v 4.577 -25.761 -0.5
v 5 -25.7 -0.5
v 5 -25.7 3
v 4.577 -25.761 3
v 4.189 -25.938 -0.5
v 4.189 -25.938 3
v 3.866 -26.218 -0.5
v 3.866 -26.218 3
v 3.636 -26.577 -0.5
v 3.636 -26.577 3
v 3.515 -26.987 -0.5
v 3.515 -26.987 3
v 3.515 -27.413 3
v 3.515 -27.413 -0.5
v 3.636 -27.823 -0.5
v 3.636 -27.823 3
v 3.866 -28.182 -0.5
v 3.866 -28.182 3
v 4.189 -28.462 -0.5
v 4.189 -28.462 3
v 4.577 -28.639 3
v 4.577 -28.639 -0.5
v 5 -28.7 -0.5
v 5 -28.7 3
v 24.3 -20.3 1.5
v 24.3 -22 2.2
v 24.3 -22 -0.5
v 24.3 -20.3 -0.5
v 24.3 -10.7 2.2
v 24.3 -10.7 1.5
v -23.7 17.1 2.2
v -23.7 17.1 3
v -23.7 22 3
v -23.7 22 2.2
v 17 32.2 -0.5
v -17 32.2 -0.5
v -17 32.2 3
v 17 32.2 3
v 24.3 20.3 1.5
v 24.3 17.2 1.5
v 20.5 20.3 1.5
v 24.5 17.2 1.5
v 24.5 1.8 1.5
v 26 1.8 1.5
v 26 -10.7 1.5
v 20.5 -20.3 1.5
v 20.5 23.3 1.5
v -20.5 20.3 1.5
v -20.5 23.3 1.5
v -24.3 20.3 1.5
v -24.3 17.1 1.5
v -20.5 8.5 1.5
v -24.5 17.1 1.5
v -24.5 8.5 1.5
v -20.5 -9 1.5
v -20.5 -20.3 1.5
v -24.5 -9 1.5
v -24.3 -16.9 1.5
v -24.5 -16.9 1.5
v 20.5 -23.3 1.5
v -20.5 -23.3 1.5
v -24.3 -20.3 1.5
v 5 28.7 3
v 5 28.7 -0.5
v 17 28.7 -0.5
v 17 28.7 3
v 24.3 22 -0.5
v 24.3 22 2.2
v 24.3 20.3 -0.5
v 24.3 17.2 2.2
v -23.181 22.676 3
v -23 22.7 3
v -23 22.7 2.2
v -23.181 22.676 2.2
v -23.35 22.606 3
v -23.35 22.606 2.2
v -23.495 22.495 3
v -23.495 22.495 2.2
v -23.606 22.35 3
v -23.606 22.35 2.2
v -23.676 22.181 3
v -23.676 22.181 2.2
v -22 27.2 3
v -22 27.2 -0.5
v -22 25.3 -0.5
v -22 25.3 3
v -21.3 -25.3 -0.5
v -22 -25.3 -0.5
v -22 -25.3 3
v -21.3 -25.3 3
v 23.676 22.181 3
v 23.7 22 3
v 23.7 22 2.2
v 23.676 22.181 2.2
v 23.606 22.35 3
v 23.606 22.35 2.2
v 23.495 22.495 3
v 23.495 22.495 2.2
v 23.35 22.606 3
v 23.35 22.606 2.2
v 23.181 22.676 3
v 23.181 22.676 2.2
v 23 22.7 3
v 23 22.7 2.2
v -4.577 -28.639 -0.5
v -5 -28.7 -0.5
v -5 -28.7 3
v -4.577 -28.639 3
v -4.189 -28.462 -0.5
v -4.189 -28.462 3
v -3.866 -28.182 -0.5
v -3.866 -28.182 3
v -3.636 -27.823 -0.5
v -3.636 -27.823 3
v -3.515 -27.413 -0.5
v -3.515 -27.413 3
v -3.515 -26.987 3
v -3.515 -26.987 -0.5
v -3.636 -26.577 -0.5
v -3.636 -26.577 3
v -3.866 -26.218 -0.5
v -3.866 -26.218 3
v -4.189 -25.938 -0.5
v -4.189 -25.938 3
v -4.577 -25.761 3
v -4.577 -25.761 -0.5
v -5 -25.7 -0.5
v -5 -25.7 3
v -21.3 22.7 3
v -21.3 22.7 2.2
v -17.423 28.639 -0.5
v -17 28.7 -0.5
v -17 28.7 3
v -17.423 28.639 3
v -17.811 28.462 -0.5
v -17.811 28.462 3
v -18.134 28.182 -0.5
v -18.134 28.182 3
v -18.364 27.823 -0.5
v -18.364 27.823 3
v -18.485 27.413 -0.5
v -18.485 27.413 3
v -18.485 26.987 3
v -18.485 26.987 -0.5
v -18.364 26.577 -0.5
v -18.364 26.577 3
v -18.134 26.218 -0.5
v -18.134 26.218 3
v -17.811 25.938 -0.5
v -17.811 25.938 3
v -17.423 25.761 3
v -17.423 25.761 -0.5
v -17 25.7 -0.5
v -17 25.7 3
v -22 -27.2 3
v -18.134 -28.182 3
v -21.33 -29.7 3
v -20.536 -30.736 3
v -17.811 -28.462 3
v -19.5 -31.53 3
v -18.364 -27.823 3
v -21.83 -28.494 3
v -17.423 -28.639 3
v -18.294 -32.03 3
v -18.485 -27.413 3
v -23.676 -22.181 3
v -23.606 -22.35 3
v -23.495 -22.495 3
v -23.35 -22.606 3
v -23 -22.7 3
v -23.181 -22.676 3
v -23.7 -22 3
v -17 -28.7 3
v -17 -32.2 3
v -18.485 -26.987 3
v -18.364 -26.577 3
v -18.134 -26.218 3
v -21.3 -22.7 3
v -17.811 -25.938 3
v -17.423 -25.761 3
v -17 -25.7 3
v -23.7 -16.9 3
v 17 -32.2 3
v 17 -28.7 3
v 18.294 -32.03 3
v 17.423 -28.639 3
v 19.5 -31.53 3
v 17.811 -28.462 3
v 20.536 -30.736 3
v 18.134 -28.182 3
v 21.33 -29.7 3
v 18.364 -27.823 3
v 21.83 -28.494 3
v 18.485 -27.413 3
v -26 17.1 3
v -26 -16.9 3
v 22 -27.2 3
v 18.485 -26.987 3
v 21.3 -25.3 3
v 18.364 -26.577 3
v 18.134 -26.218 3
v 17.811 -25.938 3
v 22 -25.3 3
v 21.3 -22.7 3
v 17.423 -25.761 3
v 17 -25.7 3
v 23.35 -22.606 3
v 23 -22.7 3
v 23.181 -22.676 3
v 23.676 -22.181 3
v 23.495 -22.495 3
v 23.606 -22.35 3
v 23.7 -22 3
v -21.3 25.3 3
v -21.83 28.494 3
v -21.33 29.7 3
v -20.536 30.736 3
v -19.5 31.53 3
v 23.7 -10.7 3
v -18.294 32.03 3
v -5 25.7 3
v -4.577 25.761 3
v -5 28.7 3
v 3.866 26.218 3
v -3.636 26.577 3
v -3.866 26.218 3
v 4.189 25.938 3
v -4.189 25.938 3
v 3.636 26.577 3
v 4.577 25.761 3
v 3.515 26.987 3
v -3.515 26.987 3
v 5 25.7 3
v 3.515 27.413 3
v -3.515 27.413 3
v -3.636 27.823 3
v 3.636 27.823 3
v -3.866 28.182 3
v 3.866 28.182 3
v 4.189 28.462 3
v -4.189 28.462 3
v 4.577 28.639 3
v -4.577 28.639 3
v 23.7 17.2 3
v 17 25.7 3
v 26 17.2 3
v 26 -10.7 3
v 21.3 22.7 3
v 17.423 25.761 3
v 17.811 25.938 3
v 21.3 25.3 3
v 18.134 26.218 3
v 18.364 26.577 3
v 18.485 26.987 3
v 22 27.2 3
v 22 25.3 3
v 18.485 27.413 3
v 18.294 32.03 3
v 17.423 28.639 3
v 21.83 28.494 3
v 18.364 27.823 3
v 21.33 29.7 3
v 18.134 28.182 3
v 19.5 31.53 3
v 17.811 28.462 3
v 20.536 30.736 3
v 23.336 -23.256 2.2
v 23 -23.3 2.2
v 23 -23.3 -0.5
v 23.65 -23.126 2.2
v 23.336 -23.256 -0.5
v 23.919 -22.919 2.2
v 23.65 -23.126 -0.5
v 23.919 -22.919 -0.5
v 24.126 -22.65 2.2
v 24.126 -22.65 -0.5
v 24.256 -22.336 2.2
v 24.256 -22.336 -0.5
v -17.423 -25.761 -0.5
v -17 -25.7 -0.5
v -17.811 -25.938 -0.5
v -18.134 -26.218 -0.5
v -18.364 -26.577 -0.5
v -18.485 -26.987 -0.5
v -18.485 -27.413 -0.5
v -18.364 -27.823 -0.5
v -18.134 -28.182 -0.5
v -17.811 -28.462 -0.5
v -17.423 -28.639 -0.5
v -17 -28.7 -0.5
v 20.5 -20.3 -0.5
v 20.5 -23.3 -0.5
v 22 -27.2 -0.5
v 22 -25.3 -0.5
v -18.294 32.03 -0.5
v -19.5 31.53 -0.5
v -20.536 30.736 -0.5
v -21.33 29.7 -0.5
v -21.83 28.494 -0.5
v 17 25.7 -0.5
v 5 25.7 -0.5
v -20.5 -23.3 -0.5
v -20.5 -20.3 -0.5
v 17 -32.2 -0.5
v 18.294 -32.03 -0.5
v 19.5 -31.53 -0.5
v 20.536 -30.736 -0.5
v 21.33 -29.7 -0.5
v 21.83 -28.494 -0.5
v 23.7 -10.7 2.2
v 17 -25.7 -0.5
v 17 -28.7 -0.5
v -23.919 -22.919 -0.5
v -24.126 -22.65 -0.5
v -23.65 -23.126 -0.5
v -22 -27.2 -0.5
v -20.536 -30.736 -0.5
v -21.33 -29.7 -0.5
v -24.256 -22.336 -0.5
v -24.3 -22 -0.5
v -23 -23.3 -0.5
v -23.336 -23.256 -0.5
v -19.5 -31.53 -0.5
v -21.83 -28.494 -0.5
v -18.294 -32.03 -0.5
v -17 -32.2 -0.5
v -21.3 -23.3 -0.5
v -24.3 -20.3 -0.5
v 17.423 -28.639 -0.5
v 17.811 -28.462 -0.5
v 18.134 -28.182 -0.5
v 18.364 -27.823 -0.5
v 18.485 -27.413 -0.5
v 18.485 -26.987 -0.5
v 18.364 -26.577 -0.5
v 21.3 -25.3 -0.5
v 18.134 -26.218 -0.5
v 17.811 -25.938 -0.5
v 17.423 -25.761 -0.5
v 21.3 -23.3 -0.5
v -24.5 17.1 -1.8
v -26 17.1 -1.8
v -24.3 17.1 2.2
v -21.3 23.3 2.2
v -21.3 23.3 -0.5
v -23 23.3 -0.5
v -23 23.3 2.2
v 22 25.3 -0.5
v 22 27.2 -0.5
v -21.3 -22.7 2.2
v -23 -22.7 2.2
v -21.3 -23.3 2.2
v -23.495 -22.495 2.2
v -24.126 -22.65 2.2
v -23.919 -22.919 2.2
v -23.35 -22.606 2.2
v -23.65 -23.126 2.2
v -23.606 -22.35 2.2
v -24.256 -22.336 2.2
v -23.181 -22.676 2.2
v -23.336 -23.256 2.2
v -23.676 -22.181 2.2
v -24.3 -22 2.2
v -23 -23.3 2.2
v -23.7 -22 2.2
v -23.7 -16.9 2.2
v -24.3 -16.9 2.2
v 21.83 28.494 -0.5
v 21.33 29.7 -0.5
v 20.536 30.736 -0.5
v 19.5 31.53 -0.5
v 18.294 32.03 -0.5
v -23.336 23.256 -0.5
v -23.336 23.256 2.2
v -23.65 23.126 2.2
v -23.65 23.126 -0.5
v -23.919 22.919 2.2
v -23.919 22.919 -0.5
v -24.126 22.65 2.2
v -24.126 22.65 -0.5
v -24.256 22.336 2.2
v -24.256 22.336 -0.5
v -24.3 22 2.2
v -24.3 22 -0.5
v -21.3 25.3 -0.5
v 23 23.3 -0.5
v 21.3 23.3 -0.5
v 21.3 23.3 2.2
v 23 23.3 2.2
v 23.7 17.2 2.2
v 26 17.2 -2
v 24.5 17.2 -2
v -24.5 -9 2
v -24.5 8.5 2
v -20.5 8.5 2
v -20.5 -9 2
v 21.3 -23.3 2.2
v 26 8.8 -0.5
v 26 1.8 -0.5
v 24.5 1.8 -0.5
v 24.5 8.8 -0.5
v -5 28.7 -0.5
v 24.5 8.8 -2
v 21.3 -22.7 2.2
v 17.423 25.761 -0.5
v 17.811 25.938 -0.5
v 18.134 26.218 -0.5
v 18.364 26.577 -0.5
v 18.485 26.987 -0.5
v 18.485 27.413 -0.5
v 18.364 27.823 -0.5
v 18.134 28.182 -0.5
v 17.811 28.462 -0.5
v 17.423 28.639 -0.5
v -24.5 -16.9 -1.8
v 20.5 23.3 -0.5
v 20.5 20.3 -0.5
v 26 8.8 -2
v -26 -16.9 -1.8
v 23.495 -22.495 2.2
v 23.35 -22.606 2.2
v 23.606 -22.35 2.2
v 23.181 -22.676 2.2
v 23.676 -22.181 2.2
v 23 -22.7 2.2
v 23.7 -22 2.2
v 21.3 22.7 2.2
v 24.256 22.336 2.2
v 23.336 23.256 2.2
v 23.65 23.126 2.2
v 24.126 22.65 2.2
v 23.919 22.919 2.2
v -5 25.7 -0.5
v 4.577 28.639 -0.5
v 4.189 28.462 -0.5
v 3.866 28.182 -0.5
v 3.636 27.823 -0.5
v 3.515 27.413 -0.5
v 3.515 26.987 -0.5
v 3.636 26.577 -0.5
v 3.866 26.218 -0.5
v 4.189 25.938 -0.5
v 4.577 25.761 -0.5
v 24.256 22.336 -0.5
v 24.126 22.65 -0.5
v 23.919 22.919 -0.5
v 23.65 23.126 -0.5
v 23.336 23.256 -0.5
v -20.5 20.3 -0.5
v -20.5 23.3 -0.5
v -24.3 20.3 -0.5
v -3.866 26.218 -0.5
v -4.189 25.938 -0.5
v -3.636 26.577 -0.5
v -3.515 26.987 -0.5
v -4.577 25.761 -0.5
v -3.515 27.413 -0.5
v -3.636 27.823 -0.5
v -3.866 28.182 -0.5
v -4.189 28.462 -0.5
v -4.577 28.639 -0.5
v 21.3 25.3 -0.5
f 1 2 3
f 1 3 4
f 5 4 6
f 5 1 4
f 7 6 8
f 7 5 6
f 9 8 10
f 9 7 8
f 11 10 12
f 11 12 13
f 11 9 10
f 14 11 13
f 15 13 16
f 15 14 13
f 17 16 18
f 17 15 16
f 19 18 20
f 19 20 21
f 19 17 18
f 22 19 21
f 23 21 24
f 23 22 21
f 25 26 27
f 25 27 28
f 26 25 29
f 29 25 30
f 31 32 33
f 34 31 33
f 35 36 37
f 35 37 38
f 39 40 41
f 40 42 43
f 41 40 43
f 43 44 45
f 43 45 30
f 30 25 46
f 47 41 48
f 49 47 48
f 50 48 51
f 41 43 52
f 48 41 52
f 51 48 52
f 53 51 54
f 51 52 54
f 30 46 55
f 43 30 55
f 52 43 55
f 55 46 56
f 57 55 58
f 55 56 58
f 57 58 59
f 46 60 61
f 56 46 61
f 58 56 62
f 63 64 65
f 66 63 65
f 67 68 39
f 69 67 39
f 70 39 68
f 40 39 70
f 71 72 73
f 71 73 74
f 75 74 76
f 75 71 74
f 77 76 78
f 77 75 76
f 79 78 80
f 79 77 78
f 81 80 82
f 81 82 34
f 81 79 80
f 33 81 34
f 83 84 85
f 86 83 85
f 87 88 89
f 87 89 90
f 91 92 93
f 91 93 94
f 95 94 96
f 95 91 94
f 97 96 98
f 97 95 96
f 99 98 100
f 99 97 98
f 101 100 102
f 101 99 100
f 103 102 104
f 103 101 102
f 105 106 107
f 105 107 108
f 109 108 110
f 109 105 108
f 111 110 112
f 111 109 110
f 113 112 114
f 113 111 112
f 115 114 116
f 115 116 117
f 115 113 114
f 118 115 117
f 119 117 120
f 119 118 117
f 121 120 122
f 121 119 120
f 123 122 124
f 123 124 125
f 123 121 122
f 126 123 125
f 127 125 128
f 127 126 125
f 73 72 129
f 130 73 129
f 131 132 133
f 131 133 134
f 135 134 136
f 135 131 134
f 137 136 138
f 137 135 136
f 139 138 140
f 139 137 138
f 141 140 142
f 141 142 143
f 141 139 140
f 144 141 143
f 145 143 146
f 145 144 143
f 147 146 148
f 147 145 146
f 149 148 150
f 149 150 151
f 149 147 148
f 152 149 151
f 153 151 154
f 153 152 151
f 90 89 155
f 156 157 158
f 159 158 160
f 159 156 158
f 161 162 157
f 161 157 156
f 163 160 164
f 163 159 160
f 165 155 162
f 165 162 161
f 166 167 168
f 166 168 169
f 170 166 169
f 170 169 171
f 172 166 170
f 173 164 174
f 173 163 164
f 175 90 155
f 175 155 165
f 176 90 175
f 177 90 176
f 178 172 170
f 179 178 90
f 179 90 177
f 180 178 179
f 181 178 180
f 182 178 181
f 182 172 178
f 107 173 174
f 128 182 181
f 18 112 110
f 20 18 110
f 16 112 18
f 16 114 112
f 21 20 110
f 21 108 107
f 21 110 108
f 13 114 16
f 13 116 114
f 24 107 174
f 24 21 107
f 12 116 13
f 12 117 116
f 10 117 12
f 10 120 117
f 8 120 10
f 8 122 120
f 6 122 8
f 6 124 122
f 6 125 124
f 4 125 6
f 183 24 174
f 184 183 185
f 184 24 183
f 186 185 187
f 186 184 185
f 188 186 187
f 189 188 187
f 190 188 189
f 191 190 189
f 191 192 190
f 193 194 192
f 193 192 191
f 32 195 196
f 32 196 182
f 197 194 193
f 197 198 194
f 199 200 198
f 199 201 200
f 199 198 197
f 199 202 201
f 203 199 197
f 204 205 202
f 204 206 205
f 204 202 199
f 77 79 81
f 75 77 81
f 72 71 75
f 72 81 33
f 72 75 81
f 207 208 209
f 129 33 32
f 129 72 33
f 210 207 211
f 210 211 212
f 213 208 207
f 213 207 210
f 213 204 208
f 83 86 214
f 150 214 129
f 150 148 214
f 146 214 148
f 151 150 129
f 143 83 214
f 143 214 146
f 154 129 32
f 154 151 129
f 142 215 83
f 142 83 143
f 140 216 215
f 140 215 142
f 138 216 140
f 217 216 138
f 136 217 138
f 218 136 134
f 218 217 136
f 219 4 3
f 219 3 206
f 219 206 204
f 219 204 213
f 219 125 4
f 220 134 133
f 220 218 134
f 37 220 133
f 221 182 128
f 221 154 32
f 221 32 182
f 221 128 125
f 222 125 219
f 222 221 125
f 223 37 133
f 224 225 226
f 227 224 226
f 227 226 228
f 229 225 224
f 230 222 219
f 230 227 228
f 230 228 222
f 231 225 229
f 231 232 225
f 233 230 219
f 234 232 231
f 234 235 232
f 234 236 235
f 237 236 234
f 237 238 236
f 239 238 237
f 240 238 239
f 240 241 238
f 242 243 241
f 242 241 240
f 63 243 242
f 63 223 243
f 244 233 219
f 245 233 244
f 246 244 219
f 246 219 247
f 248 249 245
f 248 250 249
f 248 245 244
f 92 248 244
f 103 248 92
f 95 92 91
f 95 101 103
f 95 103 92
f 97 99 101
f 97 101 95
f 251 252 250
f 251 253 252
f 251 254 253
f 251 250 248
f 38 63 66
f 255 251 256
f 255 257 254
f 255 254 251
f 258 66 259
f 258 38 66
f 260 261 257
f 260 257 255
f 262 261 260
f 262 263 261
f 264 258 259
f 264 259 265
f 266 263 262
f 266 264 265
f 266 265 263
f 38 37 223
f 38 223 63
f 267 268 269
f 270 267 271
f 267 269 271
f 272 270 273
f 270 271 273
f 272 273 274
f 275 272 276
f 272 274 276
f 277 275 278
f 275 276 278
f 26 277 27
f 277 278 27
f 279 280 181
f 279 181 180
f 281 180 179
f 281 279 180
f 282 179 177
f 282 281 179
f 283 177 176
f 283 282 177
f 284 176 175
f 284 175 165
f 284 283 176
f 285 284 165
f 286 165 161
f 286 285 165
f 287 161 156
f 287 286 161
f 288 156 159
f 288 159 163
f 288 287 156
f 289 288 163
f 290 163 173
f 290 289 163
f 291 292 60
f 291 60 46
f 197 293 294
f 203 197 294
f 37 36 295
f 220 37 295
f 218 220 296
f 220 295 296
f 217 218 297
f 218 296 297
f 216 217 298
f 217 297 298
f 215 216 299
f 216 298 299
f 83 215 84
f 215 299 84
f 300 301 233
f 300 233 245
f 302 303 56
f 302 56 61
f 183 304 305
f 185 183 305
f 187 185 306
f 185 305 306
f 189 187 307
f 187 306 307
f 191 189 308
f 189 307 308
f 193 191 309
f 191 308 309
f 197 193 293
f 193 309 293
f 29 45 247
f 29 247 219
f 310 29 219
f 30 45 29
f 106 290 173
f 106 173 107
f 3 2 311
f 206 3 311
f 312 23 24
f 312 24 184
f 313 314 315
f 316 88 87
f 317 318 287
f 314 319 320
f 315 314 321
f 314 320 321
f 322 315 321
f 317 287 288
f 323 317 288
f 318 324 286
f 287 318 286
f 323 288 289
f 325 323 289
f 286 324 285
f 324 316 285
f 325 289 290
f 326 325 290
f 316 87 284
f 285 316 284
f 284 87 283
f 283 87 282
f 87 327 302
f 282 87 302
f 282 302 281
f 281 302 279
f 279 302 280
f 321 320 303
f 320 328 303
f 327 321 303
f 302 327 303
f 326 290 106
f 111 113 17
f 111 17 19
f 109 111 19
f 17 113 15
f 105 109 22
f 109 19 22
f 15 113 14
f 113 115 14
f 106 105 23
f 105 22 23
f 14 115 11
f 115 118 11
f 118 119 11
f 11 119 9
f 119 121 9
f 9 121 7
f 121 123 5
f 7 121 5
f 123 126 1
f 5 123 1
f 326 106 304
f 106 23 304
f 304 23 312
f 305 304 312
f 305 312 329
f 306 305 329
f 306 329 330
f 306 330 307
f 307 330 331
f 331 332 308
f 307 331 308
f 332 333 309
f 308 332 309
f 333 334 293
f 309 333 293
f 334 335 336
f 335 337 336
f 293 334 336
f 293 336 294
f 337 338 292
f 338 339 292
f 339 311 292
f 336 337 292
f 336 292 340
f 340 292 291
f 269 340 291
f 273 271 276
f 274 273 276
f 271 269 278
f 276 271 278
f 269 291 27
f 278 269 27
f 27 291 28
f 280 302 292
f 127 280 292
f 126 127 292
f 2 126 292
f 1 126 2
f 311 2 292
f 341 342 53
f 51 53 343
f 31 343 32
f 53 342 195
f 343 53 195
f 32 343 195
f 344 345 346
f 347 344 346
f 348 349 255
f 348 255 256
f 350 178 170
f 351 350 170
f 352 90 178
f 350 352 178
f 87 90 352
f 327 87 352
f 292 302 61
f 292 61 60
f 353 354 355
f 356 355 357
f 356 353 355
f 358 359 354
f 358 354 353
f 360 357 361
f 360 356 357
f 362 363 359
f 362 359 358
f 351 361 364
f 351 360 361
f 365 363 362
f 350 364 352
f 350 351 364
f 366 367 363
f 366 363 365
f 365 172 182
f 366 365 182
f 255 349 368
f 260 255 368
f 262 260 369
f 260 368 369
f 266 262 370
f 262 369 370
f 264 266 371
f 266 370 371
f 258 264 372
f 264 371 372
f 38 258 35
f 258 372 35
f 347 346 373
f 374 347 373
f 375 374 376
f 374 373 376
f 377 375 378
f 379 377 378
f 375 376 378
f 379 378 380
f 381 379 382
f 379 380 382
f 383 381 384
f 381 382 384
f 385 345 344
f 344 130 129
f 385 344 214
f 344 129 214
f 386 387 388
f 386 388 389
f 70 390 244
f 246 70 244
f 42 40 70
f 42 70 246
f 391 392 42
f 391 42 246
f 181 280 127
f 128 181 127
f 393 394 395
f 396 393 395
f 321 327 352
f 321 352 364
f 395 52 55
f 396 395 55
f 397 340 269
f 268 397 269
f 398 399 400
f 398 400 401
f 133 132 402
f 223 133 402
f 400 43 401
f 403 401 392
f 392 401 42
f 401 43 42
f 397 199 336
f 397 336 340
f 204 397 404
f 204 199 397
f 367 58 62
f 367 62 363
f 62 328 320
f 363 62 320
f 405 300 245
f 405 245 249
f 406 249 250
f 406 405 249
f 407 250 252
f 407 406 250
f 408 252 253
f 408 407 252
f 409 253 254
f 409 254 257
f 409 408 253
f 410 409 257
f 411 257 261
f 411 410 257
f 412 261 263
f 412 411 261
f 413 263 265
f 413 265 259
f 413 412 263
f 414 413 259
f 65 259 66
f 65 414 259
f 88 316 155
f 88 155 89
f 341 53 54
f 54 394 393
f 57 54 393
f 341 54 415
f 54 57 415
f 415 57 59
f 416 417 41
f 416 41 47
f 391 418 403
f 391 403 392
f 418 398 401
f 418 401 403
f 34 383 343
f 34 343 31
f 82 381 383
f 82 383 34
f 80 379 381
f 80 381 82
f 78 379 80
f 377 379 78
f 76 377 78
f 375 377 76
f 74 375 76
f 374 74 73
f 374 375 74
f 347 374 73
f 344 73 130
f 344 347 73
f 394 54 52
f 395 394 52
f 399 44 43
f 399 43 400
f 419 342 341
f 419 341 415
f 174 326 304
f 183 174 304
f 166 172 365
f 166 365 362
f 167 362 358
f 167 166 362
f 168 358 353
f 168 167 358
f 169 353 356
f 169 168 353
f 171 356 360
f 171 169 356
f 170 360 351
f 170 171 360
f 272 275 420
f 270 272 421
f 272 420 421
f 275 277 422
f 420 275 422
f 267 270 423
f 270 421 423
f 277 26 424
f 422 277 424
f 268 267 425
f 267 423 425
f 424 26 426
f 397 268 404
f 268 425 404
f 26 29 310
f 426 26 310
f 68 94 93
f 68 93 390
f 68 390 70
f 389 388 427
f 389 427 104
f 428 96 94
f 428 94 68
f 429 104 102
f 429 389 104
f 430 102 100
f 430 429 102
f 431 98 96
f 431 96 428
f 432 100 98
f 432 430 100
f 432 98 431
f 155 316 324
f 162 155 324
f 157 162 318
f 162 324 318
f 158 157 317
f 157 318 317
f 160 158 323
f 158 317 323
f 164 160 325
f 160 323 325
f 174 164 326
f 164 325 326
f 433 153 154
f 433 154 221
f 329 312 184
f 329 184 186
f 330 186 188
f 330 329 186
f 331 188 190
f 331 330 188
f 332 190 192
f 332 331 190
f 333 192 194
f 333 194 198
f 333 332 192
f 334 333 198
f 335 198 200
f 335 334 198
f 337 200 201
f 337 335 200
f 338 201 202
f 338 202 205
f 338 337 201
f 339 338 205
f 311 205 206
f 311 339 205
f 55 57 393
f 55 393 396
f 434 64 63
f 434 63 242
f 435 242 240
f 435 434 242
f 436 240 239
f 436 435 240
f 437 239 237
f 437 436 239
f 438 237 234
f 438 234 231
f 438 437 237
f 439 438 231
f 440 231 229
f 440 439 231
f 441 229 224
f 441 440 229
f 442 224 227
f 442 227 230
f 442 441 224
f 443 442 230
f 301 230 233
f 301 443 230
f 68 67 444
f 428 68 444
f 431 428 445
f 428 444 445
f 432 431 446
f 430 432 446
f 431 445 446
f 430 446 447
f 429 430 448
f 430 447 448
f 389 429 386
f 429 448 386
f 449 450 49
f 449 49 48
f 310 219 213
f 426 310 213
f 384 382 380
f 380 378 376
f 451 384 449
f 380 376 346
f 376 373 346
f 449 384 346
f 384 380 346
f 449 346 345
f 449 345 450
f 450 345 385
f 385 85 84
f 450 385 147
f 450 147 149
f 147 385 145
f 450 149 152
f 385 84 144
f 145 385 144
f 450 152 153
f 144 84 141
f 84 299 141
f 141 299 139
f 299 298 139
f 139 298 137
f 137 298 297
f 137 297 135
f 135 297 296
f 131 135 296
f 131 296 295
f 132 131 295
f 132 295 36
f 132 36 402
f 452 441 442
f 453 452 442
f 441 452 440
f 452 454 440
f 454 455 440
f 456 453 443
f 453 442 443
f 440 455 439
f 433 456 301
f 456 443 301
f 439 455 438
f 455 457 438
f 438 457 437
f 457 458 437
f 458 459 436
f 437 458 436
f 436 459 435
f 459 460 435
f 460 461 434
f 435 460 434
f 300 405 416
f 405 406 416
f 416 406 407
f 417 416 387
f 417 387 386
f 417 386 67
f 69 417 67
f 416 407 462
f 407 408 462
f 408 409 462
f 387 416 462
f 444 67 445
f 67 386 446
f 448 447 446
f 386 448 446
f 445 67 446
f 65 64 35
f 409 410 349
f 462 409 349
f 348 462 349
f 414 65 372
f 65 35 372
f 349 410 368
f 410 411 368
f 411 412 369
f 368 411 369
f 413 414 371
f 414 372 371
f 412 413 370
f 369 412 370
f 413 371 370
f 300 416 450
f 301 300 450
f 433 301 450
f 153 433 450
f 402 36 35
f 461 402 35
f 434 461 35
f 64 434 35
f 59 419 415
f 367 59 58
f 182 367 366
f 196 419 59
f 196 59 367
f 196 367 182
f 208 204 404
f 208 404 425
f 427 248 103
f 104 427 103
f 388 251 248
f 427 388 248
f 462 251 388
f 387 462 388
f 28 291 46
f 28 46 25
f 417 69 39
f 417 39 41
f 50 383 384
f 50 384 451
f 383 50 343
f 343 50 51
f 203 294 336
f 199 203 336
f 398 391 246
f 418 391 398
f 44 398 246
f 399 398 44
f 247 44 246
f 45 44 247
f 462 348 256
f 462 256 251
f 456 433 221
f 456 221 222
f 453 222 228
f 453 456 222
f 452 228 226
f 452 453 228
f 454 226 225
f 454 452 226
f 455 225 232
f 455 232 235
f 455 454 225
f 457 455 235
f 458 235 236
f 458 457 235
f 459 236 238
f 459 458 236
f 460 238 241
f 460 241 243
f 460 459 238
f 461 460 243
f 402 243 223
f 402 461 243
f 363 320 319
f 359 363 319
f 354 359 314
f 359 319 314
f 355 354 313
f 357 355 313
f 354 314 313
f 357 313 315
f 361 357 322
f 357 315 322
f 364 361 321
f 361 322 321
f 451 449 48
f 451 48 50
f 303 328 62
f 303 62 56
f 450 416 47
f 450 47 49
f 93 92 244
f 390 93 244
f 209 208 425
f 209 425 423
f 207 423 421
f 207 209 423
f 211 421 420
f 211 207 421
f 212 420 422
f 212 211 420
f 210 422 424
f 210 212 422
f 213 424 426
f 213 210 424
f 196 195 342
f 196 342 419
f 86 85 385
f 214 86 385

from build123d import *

# Parameters (mm, degrees)
PAD017_DEPTH    = 3.5
POCKET027_DEPTH = 2
SKETCH054_W     = 34
SKETCH054_H     = 4.8
PAD020_DEPTH    = 1.5
PAD021_DEPTH    = 1.5
SKETCH049_W     = 4
SKETCH049_H     = 17.5
POCKET028_DEPTH = 0.5
POCKET029_DEPTH = 0.8


with BuildPart() as part:
    # Sketch045 → Pad017 (new body)
    with BuildSketch(Plane.XY):
        with BuildLine():
            ThreePointArc((-23, 23.3), (-23.9192388155, 22.9192388155), (-24.3, 22))
            Line((-24.3, 22), (-24.3, 17.1))
            Line((-26, 17.1), (-24.3, 17.1))
            Line((-26, -16.9), (-26, 17.1))
            Line((-24.3, -16.9), (-26, -16.9))
            Line((-24.3, -16.9), (-24.3, -22))
            ThreePointArc((-24.3, -22), (-23.9192388155, -22.9192388155), (-23, -23.3))
            Line((-21.3, -23.3), (-23, -23.3))
            Line((-21.3, -25.3), (-21.3, -23.3))
            Line((-22, -25.3), (-21.3, -25.3))
            Line((-22, -27.2), (-22, -25.3))
            ThreePointArc((-22, -27.2), (-20.5355339059, -30.7355339059), (-17, -32.2))
            Line((-17, -32.2), (17, -32.2))
            ThreePointArc((17, -32.2), (20.5355339059, -30.7355339059), (22, -27.2))
            Line((22, -27.2), (22, -25.3))
            Line((22, -25.3), (21.3, -25.3))
            Line((21.3, -25.3), (21.3, -23.3))
            Line((21.3, -23.3), (23, -23.3))
            ThreePointArc((23, -23.3), (23.9192388155, -22.9192388155), (24.3, -22))
            Line((24.3, -22), (24.3, -10.7))
            Line((26, -10.7), (24.3, -10.7))
            Line((26, 17.2), (26, -10.7))
            Line((24.3, 17.2), (26, 17.2))
            Line((24.3, 22), (24.3, 17.2))
            ThreePointArc((24.3, 22), (23.9192388155, 22.9192388155), (23, 23.3))
            Line((21.3, 23.3), (23, 23.3))
            Line((21.3, 25.3), (21.3, 23.3))
            Line((22, 25.3), (21.3, 25.3))
            Line((22, 27.2), (22, 25.3))
            ThreePointArc((22, 27.2), (20.5355339059, 30.7355339059), (17, 32.2))
            Line((-17, 32.2), (17, 32.2))
            ThreePointArc((-17, 32.2), (-20.5355339059, 30.7355339059), (-22, 27.2))
            Line((-22, 27.2), (-22, 25.3))
            Line((-22, 25.3), (-21.3, 25.3))
            Line((-21.3, 25.3), (-21.3, 23.3))
            Line((-21.3, 23.3), (-23, 23.3))
        make_face()
        with BuildLine():
            ThreePointArc((-17, 28.7), (-18.5, 27.2), (-17, 25.7))
            Line((-17, 25.7), (-5, 25.7))
            ThreePointArc((-5, 25.7), (-3.5, 27.2), (-5, 28.7))
            Line((-17, 28.7), (-5, 28.7))
        make_face(mode=Mode.SUBTRACT)
        with BuildLine():
            ThreePointArc((5, 28.7), (3.5, 27.2), (5, 25.7))
            Line((5, 25.7), (17, 25.7))
            ThreePointArc((17, 25.7), (18.5, 27.2), (17, 28.7))
            Line((5, 28.7), (17, 28.7))
        make_face(mode=Mode.SUBTRACT)
        with BuildLine():
            ThreePointArc((-17, -25.7), (-18.5, -27.2), (-17, -28.7))
            Line((-17, -28.7), (-5, -28.7))
            ThreePointArc((-5, -28.7), (-3.5, -27.2), (-5, -25.7))
            Line((-17, -25.7), (-5, -25.7))
        make_face(mode=Mode.SUBTRACT)
        with BuildLine():
            ThreePointArc((5, -25.7), (3.5, -27.2), (5, -28.7))
            Line((5, -28.7), (17, -28.7))
            ThreePointArc((17, -28.7), (18.5, -27.2), (17, -25.7))
            Line((5, -25.7), (17, -25.7))
        make_face(mode=Mode.SUBTRACT)
    extrude(amount=PAD017_DEPTH)

    # Sketch047 (on Face53 of Pad017) → Pocket027 (cut)
    with BuildSketch(Plane(origin=(0, 0, 0), x_dir=(1, 0, 0), z_dir=(0, 0, -1))):
        Polygon((20.5, -23.3), (-20.5, -23.3), (-20.5, -20.3), (-26, -20.3), (-26, 20.3), (-20.5, 20.3), (-20.5, 23.3), (20.5, 23.3), (20.5, 20.3), (26, 20.3), (26, -20.3), (20.5, -20.3), align=None)
    extrude(amount=-POCKET027_DEPTH, mode=Mode.SUBTRACT)

    # Sketch054 (on Face32 of Pocket027) → Pad020 (join)
    with BuildSketch(Plane(origin=(-26, 0, 0), x_dir=(0, -1, 0), z_dir=(-1, 0, 0))):
        with Locations((-0.1, 1.1)):
            Rectangle(SKETCH054_W, SKETCH054_H)
    extrude(amount=-PAD020_DEPTH)

    # Sketch055 (on Face31 of Pad020) → Pad021 (join)
    with BuildSketch(Plane.YZ.offset(26)):
        Polygon((1.8, 3.5), (1.8, 0), (8.8, 0), (8.8, -1.5), (17.2, -1.5), (17.2, 3.5), align=None)
    extrude(amount=-PAD021_DEPTH)

    # Sketch049 (on Face49 of Pad021) → Pocket028 (cut)
    with BuildSketch(Plane(origin=(0, 0, 2), x_dir=(1, 0, 0), z_dir=(0, 0, -1))):
        with Locations((-22.5, 0.25)):
            Rectangle(SKETCH049_W, SKETCH049_H)
    extrude(amount=-POCKET028_DEPTH, mode=Mode.SUBTRACT)

    # Sketch048 (on Face4 of Pocket028) → Pocket029 (cut)
    with BuildSketch(Plane.XY.offset(3.5)):
        with BuildLine():
            ThreePointArc((24.3, 22), (23.9192388155, 22.9192388155), (23, 23.3))
            Line((23, 23.3), (21.3, 23.3))
            Line((21.3, 23.3), (21.3, 22.7))
            Line((21.3, 22.7), (23.0000081541, 22.7))
            ThreePointArc((23.7, 22.0000000128), (23.4949776252, 22.4949718684), (23.0000081541, 22.7))
            Line((23.7, 22.0000000128), (23.7, 17.2))
            Line((23.7, 17.2), (24.3, 17.2))
            Line((24.3, 17.2), (24.3, 22))
        make_face()
        with BuildLine():
            Line((23, -23.3), (21.3, -23.3))
            Line((21.3, -23.3), (21.3, -22.7))
            Line((21.3, -22.7), (23.0000012126, -22.7))
            ThreePointArc((23.0000012126, -22.7), (23.4949754721, -22.4949748266), (23.7, -22.0000002998))
            Line((23.7, -10.7), (23.7, -22.0000002998))
            Line((23.7, -10.7), (24.3, -10.7))
            Line((24.3, -10.7), (24.3, -22))
            ThreePointArc((23, -23.3), (23.9192392181, -22.9192392181), (24.3, -22))
        make_face()
        with BuildLine():
            ThreePointArc((-23, 23.3), (-23.9192388155, 22.9192388155), (-24.3, 22))
            Line((-24.3, 22), (-24.3, 17.1))
            Line((-24.3, 17.1), (-23.7, 17.1))
            Line((-23.7, 17.1), (-23.7, 21.9999998829))
            ThreePointArc((-23, 22.7), (-23.4949747882, 22.4949747054), (-23.7, 21.9999998829))
            Line((-23, 22.7), (-21.3, 22.7))
            Line((-21.3, 22.7), (-21.3, 23.3))
            Line((-21.3, 23.3), (-23, 23.3))
        make_face()
        with BuildLine():
            ThreePointArc((-24.3, -22), (-23.9192388155, -22.9192388155), (-23, -23.3))
            Line((-23, -23.3), (-21.3, -23.3))
            Line((-21.3, -23.3), (-21.3, -22.7))
            Line((-21.3, -22.7), (-23.0000001118, -22.7))
            ThreePointArc((-23.7, -22), (-23.4949747864, -22.4949747073), (-23.0000001118, -22.7))
            Line((-23.7, -22), (-23.7, -16.9))
            Line((-23.7, -16.9), (-24.3, -16.9))
            Line((-24.3, -16.9), (-24.3, -22))
        make_face()
    extrude(amount=-POCKET029_DEPTH, mode=Mode.SUBTRACT)


with BuildPart() as part_1:
    # Body004 placement: moved
    add(part.part.moved(Location((0, 0, -0.5))))


solid = part_1.part
